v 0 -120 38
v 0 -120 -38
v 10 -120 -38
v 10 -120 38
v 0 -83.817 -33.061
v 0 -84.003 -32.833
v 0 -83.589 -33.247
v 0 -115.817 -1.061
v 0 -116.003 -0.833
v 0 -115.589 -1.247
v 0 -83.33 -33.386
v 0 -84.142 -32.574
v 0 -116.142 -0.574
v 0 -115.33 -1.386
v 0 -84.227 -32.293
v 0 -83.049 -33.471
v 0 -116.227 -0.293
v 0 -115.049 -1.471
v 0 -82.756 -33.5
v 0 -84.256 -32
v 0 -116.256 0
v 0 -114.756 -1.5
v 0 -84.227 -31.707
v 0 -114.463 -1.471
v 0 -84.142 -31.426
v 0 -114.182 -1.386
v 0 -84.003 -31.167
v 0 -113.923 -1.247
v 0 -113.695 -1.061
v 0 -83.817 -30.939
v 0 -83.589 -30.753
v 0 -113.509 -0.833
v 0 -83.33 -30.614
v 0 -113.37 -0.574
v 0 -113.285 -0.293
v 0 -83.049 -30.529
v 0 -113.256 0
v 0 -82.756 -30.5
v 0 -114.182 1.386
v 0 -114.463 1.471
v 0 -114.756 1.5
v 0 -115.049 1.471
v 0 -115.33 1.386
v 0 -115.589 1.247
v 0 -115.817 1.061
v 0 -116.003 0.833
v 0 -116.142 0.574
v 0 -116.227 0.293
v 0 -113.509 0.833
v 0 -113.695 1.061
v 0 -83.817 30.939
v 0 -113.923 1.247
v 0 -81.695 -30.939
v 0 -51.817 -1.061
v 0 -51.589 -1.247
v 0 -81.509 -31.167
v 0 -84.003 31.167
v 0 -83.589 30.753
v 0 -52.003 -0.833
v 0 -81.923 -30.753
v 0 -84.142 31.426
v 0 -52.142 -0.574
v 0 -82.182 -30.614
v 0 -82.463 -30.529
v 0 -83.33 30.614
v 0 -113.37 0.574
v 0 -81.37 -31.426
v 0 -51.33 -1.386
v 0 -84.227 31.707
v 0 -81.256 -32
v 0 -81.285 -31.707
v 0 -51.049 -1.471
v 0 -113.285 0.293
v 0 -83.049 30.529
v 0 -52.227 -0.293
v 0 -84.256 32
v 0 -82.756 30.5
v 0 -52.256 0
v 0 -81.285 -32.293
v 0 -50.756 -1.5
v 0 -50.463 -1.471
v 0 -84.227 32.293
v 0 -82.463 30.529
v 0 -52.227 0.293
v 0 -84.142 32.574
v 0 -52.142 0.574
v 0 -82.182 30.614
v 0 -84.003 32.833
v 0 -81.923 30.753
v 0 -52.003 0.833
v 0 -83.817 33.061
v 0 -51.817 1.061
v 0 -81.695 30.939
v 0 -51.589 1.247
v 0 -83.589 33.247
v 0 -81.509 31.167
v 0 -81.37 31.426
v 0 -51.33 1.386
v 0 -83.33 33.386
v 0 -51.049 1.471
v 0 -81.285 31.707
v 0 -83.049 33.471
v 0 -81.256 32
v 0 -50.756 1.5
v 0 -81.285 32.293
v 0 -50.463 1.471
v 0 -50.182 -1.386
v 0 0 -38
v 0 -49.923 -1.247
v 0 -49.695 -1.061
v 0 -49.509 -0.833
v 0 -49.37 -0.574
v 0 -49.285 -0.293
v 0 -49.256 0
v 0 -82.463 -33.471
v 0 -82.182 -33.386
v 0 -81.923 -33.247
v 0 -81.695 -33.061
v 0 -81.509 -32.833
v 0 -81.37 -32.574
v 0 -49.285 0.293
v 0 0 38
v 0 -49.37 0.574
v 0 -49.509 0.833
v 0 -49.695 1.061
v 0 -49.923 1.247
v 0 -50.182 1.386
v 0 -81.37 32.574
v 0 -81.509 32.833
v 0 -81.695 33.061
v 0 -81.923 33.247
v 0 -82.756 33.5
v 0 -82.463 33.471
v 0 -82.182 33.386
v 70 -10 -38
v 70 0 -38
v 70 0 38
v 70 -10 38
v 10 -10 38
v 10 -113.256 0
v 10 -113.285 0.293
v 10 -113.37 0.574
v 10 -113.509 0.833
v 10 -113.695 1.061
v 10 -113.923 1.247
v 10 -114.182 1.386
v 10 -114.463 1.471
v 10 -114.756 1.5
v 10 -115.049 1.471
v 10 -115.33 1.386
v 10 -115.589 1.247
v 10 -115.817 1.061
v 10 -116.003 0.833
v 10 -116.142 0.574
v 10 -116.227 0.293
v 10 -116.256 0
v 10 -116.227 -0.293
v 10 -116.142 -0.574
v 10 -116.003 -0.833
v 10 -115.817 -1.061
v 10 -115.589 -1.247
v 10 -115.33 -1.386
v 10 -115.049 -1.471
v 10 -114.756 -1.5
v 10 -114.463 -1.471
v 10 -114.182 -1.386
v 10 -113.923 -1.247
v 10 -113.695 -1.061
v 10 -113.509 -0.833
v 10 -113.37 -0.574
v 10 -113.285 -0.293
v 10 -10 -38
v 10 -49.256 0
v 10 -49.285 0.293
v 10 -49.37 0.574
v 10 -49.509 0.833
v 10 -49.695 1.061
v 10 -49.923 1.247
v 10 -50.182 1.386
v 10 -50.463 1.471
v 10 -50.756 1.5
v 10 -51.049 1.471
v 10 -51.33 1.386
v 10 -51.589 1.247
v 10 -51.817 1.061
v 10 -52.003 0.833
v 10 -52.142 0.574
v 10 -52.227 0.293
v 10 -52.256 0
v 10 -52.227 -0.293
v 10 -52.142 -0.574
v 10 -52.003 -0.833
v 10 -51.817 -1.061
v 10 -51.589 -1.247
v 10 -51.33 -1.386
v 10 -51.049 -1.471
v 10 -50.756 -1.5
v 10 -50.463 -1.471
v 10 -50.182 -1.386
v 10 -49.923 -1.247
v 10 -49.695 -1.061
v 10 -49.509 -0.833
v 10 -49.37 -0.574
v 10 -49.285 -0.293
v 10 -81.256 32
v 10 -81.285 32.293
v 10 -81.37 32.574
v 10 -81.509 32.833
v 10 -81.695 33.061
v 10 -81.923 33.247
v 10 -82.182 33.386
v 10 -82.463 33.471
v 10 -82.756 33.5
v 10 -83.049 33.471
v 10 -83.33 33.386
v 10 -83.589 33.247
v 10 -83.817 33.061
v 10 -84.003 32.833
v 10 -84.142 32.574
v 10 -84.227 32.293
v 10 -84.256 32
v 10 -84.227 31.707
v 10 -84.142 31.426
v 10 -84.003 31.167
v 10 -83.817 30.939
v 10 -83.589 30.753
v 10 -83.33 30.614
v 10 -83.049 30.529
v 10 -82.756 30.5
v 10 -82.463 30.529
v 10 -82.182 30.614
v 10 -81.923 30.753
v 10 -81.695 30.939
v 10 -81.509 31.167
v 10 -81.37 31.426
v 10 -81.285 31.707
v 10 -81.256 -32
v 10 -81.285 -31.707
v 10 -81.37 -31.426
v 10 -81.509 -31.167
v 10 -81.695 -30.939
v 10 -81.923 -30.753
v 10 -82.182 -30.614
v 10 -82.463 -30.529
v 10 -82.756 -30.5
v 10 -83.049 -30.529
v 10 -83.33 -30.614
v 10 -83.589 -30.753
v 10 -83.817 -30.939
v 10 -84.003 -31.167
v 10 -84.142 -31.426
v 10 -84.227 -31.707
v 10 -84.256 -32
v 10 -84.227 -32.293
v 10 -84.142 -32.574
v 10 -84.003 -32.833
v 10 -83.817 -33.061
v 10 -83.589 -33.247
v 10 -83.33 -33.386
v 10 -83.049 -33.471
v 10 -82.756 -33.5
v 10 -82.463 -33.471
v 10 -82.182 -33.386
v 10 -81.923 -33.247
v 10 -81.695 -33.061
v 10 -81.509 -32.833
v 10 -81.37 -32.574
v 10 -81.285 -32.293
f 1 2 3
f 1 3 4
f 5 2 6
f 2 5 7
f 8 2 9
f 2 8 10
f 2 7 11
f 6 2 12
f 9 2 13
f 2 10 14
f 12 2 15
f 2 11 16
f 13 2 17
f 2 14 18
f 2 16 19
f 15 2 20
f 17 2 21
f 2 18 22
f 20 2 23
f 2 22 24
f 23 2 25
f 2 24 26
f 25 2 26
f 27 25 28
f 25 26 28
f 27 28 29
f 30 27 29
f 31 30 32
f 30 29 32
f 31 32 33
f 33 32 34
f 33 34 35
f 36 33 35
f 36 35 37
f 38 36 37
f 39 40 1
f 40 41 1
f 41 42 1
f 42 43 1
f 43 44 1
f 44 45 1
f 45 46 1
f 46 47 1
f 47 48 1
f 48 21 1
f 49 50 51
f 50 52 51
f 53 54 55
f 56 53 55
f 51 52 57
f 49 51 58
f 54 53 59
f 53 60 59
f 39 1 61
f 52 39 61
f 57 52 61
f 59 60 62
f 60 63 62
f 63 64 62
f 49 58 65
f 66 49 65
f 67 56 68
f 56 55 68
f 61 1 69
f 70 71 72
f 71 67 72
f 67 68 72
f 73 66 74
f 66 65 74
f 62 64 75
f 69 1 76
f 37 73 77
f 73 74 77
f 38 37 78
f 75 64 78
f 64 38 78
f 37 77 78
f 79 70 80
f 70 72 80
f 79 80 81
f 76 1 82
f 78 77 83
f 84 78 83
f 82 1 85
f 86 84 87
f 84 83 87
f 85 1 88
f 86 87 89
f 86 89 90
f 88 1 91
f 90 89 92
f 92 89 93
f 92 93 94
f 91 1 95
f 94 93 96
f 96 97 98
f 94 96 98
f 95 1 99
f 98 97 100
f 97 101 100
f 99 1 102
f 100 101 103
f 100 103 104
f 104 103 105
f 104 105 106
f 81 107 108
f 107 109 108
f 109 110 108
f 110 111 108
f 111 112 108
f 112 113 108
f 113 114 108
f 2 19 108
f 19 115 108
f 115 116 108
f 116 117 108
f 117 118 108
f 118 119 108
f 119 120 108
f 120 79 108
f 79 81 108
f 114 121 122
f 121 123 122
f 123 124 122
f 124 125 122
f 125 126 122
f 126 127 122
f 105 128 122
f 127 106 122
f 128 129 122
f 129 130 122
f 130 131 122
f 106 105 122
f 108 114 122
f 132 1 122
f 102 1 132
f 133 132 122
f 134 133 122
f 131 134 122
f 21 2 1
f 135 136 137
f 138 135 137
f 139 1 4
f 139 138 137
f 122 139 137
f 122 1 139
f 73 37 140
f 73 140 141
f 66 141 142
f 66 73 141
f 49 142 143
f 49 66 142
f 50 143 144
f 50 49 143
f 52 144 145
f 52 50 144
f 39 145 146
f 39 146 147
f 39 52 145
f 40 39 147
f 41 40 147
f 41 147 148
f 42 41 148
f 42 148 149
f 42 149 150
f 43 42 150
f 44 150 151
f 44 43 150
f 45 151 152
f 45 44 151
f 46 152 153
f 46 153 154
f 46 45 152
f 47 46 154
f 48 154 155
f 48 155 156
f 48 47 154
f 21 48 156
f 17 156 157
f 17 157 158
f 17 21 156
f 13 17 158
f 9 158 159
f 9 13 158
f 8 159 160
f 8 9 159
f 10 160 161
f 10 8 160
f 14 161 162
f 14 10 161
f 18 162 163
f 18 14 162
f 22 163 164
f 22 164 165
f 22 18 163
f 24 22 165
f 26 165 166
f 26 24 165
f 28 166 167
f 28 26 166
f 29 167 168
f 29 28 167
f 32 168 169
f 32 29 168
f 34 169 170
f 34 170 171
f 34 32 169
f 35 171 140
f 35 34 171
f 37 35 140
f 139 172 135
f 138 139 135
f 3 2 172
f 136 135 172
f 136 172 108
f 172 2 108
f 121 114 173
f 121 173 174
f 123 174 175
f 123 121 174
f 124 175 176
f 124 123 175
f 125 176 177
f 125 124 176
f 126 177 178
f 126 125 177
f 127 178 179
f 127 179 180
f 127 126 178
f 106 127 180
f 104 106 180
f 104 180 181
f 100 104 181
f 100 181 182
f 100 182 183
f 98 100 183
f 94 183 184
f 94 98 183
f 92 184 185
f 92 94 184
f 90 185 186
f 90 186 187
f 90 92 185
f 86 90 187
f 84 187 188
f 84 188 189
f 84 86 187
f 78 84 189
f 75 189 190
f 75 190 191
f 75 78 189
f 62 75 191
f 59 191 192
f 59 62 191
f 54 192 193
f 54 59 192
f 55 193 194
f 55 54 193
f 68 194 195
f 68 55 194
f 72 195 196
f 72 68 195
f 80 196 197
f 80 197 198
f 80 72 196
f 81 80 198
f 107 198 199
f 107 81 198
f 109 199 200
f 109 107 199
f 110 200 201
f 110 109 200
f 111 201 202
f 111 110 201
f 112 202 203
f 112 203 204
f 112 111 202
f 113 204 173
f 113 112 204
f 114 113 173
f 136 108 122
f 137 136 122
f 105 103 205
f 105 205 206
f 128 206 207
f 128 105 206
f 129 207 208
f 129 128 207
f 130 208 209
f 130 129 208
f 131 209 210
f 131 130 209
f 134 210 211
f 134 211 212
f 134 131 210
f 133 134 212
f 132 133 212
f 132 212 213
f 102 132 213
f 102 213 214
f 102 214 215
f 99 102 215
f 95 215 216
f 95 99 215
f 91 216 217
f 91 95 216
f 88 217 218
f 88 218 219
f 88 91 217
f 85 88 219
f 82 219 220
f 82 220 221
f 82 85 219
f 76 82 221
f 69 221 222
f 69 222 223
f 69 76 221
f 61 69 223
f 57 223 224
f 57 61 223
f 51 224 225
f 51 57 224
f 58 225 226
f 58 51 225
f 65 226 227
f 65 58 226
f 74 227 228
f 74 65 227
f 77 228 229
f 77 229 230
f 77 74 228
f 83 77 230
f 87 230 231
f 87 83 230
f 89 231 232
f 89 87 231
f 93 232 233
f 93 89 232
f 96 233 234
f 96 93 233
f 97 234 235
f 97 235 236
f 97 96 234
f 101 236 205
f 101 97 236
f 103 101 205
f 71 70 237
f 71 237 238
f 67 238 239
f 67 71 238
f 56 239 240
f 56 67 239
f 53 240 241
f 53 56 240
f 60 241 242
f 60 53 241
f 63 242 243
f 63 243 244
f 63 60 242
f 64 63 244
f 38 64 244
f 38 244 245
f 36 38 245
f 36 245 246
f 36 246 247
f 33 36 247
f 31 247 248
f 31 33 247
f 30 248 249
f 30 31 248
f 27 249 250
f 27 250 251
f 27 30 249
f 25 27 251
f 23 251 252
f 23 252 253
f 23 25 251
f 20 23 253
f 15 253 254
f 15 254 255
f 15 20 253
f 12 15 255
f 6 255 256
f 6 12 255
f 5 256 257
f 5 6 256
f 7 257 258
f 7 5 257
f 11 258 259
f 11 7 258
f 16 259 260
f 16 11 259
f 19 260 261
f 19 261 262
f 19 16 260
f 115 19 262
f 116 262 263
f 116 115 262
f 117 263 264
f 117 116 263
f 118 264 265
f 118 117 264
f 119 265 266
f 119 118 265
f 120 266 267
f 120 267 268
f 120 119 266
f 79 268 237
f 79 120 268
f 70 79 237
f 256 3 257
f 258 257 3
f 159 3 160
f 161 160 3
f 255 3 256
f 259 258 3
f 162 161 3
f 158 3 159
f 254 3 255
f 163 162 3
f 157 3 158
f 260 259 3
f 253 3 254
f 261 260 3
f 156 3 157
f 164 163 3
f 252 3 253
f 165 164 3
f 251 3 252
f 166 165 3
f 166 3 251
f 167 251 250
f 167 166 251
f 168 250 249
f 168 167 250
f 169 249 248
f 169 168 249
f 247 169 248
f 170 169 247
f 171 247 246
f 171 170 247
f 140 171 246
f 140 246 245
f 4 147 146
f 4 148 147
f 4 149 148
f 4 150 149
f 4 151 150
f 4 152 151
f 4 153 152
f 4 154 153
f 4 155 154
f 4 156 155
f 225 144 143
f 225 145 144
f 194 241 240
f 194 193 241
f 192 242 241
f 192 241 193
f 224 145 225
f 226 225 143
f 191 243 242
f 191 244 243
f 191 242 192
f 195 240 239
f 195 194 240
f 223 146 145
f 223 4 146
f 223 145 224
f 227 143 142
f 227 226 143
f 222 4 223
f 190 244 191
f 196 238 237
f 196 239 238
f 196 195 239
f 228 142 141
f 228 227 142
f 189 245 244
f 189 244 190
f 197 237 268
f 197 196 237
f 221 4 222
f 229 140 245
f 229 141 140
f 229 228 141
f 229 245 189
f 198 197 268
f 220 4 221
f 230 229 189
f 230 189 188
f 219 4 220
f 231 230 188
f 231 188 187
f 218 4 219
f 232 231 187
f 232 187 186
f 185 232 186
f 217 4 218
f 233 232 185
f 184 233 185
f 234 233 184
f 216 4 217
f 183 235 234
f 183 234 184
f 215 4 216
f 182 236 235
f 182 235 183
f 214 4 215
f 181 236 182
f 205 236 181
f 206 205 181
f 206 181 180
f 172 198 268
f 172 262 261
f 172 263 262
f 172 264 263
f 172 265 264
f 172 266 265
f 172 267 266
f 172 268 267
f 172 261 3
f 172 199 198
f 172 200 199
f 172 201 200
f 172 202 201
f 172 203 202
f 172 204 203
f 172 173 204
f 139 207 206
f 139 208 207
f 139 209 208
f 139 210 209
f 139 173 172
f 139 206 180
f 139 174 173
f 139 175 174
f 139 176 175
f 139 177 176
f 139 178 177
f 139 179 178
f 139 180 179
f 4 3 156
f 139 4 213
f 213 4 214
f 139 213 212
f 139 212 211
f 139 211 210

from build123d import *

# Parameters (mm, degrees)
SKETCH001_W  = 120
SKETCH001_H  = 76
SKETCH001_R  = 1.5
PAD_DEPTH    = 10
SKETCH_W     = 70
SKETCH_H     = 76
PAD001_DEPTH = 10


with BuildPart() as part:
    # Sketch001 → Pad (new body)
    with BuildSketch(Plane.YZ):
        with Locations((-60, 0)):
            Rectangle(SKETCH001_W, SKETCH001_H)
        with Locations((-82.756082, 32)):
            Circle(SKETCH001_R, mode=Mode.SUBTRACT)
        with Locations((-114.756082, 0)):
            Circle(SKETCH001_R, mode=Mode.SUBTRACT)
        with Locations((-50.756082, 0)):
            Circle(SKETCH001_R, mode=Mode.SUBTRACT)
        with Locations((-82.756082, -32)):
            Circle(SKETCH001_R, mode=Mode.SUBTRACT)
    extrude(amount=PAD_DEPTH)

    # Sketch → Pad001 (join)
    with BuildSketch(Plane.XZ):
        with Locations((35, 0)):
            Rectangle(SKETCH_W, SKETCH_H)
    extrude(amount=PAD001_DEPTH)


solid = part.part
